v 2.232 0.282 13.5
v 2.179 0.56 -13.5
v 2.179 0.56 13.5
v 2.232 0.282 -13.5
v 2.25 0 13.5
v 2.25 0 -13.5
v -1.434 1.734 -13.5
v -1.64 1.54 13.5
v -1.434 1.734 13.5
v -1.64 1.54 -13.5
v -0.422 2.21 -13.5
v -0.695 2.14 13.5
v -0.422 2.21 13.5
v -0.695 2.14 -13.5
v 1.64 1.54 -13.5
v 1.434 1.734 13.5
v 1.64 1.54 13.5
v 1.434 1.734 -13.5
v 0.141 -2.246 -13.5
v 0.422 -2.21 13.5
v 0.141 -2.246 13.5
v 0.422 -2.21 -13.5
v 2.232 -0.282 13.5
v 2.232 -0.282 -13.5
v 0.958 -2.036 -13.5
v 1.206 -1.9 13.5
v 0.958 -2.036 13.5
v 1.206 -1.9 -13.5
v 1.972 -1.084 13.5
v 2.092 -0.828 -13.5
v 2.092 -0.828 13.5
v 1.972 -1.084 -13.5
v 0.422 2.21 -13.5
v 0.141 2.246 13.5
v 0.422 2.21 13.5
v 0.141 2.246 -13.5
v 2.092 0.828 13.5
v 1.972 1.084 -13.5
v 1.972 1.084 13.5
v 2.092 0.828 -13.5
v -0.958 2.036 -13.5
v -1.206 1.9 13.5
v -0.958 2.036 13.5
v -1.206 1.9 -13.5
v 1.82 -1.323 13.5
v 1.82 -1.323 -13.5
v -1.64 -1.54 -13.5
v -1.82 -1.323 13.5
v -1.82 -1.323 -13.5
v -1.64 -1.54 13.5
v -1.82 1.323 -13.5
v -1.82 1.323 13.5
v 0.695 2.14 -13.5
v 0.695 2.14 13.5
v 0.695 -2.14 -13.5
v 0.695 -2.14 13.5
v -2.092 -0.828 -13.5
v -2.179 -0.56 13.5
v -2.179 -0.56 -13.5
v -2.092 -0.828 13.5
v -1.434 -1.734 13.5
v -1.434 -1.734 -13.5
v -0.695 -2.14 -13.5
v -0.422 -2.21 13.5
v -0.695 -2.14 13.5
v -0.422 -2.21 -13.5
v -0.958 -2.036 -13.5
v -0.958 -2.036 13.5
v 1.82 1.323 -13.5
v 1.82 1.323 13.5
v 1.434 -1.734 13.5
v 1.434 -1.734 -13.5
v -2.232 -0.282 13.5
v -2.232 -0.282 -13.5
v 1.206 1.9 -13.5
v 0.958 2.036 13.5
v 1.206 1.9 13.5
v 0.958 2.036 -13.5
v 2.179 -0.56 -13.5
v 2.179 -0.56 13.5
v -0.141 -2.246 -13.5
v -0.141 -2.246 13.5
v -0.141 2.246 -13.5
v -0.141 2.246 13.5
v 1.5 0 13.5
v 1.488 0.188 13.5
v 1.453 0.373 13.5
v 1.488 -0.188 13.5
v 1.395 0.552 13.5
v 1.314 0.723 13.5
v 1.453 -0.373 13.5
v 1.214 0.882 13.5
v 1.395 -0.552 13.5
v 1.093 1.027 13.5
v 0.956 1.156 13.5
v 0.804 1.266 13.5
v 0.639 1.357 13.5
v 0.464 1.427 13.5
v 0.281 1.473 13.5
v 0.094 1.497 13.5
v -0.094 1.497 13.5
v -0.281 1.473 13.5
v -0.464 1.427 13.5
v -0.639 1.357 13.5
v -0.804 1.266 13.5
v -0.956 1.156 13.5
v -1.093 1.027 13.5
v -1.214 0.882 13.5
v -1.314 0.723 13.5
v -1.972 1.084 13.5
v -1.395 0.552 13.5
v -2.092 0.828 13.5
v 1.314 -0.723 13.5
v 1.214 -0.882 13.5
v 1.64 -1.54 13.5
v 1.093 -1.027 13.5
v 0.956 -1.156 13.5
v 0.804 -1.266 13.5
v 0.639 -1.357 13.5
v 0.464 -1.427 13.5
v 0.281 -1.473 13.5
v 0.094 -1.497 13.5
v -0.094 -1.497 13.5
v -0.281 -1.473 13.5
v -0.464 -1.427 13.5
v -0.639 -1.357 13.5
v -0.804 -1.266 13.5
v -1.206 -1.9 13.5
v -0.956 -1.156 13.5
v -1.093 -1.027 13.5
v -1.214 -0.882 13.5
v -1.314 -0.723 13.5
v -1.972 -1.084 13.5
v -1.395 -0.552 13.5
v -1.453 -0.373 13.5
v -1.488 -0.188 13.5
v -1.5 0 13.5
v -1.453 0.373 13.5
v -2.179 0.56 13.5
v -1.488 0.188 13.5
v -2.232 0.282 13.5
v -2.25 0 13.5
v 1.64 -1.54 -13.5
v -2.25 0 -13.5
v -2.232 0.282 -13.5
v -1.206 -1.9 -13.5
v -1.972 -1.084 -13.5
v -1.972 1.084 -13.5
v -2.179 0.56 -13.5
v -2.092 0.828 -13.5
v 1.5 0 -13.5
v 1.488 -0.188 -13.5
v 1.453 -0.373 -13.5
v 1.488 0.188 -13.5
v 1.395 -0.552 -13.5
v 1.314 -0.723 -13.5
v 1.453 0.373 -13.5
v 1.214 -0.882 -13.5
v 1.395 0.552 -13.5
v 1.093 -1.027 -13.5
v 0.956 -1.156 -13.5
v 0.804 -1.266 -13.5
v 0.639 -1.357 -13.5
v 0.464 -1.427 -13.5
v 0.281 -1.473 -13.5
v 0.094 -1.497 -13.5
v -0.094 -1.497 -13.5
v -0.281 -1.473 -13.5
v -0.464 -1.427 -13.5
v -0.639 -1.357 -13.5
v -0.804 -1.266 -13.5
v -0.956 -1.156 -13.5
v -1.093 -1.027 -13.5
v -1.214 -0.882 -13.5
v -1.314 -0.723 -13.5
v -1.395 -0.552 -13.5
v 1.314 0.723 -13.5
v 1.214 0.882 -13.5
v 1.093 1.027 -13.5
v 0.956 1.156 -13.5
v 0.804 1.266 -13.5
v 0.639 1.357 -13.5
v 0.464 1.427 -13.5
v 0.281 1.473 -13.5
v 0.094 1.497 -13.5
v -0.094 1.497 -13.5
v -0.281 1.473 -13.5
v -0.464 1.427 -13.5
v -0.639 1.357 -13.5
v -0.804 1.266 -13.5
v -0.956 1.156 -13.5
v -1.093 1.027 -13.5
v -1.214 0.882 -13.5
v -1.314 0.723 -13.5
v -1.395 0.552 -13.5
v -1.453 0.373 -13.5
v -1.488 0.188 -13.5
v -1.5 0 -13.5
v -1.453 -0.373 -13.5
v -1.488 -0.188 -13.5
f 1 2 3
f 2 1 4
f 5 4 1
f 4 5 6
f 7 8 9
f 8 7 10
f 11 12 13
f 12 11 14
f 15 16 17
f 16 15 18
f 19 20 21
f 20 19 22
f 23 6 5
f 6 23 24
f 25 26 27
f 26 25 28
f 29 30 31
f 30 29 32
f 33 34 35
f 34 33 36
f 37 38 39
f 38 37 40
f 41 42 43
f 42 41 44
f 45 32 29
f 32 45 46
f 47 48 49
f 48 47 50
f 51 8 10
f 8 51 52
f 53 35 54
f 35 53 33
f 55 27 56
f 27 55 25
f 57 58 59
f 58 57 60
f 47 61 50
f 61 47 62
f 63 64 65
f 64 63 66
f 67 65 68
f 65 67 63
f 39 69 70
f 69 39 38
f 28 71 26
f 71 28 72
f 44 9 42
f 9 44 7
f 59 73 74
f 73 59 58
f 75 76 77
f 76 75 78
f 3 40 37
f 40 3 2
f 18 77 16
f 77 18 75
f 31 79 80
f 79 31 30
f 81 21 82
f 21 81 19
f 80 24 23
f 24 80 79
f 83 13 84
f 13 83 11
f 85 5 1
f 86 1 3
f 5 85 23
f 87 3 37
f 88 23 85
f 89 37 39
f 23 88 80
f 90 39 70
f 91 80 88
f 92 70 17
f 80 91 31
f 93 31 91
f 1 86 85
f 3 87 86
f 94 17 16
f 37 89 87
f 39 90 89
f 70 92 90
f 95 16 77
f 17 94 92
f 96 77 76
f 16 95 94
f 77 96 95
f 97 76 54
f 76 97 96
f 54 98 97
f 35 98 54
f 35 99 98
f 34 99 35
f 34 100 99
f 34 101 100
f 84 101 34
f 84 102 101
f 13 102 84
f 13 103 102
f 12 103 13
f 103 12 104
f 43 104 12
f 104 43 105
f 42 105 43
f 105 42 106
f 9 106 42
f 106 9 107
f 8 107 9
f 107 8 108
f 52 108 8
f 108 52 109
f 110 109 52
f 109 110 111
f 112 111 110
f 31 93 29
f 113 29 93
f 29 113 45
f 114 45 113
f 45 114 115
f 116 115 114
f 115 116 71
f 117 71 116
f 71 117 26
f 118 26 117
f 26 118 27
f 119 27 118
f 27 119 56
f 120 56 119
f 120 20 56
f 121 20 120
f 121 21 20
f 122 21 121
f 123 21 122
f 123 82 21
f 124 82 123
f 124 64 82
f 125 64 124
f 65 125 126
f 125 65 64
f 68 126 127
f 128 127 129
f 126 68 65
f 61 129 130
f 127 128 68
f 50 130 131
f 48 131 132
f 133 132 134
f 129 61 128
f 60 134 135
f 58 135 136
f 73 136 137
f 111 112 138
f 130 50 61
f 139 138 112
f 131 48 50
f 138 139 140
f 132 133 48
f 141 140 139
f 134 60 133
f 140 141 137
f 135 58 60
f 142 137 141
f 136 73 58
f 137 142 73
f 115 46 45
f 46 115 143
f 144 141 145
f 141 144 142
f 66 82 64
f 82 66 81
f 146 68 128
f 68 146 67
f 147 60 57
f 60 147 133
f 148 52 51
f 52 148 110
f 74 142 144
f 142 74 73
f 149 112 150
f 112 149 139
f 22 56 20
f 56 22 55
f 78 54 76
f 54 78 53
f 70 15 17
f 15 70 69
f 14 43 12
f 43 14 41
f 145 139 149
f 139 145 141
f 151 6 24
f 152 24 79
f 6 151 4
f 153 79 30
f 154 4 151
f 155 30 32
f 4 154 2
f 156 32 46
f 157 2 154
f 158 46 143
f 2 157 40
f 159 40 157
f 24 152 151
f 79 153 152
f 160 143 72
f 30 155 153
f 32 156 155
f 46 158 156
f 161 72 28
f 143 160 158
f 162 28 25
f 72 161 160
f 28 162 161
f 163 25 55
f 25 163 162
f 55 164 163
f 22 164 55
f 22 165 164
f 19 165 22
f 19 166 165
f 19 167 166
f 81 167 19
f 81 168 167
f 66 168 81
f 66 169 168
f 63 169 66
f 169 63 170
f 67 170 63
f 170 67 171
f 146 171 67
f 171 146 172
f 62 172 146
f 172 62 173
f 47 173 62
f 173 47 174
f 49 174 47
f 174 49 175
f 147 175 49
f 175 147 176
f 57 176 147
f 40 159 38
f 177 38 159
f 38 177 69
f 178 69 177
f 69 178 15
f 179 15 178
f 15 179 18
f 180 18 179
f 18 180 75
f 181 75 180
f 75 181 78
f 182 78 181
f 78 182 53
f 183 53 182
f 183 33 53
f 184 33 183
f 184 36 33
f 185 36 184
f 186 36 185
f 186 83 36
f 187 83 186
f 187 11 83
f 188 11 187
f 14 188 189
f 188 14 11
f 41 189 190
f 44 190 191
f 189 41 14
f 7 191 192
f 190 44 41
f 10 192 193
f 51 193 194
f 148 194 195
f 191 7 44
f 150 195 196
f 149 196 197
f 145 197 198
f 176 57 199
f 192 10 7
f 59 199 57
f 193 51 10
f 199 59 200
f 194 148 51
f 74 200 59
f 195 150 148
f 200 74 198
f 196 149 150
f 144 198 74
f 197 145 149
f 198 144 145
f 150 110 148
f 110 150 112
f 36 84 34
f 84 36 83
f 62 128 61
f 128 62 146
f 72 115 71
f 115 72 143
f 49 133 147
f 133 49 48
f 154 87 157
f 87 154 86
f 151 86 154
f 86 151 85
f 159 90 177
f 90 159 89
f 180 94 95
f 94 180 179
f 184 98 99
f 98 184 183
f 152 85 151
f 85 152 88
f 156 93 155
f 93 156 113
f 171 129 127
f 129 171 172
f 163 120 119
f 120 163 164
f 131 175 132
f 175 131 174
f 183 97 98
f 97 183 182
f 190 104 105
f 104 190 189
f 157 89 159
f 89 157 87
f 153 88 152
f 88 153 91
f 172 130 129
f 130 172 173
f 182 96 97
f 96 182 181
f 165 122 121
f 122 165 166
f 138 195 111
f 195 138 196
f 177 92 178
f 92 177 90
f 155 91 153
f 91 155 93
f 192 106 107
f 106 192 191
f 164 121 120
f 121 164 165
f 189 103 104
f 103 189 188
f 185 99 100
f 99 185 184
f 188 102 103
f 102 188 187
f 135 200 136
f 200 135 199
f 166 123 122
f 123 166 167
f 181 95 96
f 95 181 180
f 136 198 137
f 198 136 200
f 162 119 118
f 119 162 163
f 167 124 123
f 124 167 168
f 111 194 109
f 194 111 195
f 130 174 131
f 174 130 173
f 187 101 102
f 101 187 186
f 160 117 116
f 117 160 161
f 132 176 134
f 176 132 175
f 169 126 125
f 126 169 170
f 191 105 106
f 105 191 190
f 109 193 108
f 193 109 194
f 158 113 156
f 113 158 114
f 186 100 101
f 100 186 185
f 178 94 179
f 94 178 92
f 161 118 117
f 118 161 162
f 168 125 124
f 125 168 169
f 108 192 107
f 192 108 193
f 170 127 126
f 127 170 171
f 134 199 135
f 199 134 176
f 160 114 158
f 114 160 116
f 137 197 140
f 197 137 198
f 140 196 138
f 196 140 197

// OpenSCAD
$fn = 50;


difference() {
	union() {
		translate(v = [0, 0, -13.5000000000]) {
			cylinder(h = 27, r = 2.2500000000);
		}
	}
	union() {
		translate(v = [0, 0, -100.0000000000]) {
			cylinder(h = 200, r = 1.5000000000);
		}
	}
}
